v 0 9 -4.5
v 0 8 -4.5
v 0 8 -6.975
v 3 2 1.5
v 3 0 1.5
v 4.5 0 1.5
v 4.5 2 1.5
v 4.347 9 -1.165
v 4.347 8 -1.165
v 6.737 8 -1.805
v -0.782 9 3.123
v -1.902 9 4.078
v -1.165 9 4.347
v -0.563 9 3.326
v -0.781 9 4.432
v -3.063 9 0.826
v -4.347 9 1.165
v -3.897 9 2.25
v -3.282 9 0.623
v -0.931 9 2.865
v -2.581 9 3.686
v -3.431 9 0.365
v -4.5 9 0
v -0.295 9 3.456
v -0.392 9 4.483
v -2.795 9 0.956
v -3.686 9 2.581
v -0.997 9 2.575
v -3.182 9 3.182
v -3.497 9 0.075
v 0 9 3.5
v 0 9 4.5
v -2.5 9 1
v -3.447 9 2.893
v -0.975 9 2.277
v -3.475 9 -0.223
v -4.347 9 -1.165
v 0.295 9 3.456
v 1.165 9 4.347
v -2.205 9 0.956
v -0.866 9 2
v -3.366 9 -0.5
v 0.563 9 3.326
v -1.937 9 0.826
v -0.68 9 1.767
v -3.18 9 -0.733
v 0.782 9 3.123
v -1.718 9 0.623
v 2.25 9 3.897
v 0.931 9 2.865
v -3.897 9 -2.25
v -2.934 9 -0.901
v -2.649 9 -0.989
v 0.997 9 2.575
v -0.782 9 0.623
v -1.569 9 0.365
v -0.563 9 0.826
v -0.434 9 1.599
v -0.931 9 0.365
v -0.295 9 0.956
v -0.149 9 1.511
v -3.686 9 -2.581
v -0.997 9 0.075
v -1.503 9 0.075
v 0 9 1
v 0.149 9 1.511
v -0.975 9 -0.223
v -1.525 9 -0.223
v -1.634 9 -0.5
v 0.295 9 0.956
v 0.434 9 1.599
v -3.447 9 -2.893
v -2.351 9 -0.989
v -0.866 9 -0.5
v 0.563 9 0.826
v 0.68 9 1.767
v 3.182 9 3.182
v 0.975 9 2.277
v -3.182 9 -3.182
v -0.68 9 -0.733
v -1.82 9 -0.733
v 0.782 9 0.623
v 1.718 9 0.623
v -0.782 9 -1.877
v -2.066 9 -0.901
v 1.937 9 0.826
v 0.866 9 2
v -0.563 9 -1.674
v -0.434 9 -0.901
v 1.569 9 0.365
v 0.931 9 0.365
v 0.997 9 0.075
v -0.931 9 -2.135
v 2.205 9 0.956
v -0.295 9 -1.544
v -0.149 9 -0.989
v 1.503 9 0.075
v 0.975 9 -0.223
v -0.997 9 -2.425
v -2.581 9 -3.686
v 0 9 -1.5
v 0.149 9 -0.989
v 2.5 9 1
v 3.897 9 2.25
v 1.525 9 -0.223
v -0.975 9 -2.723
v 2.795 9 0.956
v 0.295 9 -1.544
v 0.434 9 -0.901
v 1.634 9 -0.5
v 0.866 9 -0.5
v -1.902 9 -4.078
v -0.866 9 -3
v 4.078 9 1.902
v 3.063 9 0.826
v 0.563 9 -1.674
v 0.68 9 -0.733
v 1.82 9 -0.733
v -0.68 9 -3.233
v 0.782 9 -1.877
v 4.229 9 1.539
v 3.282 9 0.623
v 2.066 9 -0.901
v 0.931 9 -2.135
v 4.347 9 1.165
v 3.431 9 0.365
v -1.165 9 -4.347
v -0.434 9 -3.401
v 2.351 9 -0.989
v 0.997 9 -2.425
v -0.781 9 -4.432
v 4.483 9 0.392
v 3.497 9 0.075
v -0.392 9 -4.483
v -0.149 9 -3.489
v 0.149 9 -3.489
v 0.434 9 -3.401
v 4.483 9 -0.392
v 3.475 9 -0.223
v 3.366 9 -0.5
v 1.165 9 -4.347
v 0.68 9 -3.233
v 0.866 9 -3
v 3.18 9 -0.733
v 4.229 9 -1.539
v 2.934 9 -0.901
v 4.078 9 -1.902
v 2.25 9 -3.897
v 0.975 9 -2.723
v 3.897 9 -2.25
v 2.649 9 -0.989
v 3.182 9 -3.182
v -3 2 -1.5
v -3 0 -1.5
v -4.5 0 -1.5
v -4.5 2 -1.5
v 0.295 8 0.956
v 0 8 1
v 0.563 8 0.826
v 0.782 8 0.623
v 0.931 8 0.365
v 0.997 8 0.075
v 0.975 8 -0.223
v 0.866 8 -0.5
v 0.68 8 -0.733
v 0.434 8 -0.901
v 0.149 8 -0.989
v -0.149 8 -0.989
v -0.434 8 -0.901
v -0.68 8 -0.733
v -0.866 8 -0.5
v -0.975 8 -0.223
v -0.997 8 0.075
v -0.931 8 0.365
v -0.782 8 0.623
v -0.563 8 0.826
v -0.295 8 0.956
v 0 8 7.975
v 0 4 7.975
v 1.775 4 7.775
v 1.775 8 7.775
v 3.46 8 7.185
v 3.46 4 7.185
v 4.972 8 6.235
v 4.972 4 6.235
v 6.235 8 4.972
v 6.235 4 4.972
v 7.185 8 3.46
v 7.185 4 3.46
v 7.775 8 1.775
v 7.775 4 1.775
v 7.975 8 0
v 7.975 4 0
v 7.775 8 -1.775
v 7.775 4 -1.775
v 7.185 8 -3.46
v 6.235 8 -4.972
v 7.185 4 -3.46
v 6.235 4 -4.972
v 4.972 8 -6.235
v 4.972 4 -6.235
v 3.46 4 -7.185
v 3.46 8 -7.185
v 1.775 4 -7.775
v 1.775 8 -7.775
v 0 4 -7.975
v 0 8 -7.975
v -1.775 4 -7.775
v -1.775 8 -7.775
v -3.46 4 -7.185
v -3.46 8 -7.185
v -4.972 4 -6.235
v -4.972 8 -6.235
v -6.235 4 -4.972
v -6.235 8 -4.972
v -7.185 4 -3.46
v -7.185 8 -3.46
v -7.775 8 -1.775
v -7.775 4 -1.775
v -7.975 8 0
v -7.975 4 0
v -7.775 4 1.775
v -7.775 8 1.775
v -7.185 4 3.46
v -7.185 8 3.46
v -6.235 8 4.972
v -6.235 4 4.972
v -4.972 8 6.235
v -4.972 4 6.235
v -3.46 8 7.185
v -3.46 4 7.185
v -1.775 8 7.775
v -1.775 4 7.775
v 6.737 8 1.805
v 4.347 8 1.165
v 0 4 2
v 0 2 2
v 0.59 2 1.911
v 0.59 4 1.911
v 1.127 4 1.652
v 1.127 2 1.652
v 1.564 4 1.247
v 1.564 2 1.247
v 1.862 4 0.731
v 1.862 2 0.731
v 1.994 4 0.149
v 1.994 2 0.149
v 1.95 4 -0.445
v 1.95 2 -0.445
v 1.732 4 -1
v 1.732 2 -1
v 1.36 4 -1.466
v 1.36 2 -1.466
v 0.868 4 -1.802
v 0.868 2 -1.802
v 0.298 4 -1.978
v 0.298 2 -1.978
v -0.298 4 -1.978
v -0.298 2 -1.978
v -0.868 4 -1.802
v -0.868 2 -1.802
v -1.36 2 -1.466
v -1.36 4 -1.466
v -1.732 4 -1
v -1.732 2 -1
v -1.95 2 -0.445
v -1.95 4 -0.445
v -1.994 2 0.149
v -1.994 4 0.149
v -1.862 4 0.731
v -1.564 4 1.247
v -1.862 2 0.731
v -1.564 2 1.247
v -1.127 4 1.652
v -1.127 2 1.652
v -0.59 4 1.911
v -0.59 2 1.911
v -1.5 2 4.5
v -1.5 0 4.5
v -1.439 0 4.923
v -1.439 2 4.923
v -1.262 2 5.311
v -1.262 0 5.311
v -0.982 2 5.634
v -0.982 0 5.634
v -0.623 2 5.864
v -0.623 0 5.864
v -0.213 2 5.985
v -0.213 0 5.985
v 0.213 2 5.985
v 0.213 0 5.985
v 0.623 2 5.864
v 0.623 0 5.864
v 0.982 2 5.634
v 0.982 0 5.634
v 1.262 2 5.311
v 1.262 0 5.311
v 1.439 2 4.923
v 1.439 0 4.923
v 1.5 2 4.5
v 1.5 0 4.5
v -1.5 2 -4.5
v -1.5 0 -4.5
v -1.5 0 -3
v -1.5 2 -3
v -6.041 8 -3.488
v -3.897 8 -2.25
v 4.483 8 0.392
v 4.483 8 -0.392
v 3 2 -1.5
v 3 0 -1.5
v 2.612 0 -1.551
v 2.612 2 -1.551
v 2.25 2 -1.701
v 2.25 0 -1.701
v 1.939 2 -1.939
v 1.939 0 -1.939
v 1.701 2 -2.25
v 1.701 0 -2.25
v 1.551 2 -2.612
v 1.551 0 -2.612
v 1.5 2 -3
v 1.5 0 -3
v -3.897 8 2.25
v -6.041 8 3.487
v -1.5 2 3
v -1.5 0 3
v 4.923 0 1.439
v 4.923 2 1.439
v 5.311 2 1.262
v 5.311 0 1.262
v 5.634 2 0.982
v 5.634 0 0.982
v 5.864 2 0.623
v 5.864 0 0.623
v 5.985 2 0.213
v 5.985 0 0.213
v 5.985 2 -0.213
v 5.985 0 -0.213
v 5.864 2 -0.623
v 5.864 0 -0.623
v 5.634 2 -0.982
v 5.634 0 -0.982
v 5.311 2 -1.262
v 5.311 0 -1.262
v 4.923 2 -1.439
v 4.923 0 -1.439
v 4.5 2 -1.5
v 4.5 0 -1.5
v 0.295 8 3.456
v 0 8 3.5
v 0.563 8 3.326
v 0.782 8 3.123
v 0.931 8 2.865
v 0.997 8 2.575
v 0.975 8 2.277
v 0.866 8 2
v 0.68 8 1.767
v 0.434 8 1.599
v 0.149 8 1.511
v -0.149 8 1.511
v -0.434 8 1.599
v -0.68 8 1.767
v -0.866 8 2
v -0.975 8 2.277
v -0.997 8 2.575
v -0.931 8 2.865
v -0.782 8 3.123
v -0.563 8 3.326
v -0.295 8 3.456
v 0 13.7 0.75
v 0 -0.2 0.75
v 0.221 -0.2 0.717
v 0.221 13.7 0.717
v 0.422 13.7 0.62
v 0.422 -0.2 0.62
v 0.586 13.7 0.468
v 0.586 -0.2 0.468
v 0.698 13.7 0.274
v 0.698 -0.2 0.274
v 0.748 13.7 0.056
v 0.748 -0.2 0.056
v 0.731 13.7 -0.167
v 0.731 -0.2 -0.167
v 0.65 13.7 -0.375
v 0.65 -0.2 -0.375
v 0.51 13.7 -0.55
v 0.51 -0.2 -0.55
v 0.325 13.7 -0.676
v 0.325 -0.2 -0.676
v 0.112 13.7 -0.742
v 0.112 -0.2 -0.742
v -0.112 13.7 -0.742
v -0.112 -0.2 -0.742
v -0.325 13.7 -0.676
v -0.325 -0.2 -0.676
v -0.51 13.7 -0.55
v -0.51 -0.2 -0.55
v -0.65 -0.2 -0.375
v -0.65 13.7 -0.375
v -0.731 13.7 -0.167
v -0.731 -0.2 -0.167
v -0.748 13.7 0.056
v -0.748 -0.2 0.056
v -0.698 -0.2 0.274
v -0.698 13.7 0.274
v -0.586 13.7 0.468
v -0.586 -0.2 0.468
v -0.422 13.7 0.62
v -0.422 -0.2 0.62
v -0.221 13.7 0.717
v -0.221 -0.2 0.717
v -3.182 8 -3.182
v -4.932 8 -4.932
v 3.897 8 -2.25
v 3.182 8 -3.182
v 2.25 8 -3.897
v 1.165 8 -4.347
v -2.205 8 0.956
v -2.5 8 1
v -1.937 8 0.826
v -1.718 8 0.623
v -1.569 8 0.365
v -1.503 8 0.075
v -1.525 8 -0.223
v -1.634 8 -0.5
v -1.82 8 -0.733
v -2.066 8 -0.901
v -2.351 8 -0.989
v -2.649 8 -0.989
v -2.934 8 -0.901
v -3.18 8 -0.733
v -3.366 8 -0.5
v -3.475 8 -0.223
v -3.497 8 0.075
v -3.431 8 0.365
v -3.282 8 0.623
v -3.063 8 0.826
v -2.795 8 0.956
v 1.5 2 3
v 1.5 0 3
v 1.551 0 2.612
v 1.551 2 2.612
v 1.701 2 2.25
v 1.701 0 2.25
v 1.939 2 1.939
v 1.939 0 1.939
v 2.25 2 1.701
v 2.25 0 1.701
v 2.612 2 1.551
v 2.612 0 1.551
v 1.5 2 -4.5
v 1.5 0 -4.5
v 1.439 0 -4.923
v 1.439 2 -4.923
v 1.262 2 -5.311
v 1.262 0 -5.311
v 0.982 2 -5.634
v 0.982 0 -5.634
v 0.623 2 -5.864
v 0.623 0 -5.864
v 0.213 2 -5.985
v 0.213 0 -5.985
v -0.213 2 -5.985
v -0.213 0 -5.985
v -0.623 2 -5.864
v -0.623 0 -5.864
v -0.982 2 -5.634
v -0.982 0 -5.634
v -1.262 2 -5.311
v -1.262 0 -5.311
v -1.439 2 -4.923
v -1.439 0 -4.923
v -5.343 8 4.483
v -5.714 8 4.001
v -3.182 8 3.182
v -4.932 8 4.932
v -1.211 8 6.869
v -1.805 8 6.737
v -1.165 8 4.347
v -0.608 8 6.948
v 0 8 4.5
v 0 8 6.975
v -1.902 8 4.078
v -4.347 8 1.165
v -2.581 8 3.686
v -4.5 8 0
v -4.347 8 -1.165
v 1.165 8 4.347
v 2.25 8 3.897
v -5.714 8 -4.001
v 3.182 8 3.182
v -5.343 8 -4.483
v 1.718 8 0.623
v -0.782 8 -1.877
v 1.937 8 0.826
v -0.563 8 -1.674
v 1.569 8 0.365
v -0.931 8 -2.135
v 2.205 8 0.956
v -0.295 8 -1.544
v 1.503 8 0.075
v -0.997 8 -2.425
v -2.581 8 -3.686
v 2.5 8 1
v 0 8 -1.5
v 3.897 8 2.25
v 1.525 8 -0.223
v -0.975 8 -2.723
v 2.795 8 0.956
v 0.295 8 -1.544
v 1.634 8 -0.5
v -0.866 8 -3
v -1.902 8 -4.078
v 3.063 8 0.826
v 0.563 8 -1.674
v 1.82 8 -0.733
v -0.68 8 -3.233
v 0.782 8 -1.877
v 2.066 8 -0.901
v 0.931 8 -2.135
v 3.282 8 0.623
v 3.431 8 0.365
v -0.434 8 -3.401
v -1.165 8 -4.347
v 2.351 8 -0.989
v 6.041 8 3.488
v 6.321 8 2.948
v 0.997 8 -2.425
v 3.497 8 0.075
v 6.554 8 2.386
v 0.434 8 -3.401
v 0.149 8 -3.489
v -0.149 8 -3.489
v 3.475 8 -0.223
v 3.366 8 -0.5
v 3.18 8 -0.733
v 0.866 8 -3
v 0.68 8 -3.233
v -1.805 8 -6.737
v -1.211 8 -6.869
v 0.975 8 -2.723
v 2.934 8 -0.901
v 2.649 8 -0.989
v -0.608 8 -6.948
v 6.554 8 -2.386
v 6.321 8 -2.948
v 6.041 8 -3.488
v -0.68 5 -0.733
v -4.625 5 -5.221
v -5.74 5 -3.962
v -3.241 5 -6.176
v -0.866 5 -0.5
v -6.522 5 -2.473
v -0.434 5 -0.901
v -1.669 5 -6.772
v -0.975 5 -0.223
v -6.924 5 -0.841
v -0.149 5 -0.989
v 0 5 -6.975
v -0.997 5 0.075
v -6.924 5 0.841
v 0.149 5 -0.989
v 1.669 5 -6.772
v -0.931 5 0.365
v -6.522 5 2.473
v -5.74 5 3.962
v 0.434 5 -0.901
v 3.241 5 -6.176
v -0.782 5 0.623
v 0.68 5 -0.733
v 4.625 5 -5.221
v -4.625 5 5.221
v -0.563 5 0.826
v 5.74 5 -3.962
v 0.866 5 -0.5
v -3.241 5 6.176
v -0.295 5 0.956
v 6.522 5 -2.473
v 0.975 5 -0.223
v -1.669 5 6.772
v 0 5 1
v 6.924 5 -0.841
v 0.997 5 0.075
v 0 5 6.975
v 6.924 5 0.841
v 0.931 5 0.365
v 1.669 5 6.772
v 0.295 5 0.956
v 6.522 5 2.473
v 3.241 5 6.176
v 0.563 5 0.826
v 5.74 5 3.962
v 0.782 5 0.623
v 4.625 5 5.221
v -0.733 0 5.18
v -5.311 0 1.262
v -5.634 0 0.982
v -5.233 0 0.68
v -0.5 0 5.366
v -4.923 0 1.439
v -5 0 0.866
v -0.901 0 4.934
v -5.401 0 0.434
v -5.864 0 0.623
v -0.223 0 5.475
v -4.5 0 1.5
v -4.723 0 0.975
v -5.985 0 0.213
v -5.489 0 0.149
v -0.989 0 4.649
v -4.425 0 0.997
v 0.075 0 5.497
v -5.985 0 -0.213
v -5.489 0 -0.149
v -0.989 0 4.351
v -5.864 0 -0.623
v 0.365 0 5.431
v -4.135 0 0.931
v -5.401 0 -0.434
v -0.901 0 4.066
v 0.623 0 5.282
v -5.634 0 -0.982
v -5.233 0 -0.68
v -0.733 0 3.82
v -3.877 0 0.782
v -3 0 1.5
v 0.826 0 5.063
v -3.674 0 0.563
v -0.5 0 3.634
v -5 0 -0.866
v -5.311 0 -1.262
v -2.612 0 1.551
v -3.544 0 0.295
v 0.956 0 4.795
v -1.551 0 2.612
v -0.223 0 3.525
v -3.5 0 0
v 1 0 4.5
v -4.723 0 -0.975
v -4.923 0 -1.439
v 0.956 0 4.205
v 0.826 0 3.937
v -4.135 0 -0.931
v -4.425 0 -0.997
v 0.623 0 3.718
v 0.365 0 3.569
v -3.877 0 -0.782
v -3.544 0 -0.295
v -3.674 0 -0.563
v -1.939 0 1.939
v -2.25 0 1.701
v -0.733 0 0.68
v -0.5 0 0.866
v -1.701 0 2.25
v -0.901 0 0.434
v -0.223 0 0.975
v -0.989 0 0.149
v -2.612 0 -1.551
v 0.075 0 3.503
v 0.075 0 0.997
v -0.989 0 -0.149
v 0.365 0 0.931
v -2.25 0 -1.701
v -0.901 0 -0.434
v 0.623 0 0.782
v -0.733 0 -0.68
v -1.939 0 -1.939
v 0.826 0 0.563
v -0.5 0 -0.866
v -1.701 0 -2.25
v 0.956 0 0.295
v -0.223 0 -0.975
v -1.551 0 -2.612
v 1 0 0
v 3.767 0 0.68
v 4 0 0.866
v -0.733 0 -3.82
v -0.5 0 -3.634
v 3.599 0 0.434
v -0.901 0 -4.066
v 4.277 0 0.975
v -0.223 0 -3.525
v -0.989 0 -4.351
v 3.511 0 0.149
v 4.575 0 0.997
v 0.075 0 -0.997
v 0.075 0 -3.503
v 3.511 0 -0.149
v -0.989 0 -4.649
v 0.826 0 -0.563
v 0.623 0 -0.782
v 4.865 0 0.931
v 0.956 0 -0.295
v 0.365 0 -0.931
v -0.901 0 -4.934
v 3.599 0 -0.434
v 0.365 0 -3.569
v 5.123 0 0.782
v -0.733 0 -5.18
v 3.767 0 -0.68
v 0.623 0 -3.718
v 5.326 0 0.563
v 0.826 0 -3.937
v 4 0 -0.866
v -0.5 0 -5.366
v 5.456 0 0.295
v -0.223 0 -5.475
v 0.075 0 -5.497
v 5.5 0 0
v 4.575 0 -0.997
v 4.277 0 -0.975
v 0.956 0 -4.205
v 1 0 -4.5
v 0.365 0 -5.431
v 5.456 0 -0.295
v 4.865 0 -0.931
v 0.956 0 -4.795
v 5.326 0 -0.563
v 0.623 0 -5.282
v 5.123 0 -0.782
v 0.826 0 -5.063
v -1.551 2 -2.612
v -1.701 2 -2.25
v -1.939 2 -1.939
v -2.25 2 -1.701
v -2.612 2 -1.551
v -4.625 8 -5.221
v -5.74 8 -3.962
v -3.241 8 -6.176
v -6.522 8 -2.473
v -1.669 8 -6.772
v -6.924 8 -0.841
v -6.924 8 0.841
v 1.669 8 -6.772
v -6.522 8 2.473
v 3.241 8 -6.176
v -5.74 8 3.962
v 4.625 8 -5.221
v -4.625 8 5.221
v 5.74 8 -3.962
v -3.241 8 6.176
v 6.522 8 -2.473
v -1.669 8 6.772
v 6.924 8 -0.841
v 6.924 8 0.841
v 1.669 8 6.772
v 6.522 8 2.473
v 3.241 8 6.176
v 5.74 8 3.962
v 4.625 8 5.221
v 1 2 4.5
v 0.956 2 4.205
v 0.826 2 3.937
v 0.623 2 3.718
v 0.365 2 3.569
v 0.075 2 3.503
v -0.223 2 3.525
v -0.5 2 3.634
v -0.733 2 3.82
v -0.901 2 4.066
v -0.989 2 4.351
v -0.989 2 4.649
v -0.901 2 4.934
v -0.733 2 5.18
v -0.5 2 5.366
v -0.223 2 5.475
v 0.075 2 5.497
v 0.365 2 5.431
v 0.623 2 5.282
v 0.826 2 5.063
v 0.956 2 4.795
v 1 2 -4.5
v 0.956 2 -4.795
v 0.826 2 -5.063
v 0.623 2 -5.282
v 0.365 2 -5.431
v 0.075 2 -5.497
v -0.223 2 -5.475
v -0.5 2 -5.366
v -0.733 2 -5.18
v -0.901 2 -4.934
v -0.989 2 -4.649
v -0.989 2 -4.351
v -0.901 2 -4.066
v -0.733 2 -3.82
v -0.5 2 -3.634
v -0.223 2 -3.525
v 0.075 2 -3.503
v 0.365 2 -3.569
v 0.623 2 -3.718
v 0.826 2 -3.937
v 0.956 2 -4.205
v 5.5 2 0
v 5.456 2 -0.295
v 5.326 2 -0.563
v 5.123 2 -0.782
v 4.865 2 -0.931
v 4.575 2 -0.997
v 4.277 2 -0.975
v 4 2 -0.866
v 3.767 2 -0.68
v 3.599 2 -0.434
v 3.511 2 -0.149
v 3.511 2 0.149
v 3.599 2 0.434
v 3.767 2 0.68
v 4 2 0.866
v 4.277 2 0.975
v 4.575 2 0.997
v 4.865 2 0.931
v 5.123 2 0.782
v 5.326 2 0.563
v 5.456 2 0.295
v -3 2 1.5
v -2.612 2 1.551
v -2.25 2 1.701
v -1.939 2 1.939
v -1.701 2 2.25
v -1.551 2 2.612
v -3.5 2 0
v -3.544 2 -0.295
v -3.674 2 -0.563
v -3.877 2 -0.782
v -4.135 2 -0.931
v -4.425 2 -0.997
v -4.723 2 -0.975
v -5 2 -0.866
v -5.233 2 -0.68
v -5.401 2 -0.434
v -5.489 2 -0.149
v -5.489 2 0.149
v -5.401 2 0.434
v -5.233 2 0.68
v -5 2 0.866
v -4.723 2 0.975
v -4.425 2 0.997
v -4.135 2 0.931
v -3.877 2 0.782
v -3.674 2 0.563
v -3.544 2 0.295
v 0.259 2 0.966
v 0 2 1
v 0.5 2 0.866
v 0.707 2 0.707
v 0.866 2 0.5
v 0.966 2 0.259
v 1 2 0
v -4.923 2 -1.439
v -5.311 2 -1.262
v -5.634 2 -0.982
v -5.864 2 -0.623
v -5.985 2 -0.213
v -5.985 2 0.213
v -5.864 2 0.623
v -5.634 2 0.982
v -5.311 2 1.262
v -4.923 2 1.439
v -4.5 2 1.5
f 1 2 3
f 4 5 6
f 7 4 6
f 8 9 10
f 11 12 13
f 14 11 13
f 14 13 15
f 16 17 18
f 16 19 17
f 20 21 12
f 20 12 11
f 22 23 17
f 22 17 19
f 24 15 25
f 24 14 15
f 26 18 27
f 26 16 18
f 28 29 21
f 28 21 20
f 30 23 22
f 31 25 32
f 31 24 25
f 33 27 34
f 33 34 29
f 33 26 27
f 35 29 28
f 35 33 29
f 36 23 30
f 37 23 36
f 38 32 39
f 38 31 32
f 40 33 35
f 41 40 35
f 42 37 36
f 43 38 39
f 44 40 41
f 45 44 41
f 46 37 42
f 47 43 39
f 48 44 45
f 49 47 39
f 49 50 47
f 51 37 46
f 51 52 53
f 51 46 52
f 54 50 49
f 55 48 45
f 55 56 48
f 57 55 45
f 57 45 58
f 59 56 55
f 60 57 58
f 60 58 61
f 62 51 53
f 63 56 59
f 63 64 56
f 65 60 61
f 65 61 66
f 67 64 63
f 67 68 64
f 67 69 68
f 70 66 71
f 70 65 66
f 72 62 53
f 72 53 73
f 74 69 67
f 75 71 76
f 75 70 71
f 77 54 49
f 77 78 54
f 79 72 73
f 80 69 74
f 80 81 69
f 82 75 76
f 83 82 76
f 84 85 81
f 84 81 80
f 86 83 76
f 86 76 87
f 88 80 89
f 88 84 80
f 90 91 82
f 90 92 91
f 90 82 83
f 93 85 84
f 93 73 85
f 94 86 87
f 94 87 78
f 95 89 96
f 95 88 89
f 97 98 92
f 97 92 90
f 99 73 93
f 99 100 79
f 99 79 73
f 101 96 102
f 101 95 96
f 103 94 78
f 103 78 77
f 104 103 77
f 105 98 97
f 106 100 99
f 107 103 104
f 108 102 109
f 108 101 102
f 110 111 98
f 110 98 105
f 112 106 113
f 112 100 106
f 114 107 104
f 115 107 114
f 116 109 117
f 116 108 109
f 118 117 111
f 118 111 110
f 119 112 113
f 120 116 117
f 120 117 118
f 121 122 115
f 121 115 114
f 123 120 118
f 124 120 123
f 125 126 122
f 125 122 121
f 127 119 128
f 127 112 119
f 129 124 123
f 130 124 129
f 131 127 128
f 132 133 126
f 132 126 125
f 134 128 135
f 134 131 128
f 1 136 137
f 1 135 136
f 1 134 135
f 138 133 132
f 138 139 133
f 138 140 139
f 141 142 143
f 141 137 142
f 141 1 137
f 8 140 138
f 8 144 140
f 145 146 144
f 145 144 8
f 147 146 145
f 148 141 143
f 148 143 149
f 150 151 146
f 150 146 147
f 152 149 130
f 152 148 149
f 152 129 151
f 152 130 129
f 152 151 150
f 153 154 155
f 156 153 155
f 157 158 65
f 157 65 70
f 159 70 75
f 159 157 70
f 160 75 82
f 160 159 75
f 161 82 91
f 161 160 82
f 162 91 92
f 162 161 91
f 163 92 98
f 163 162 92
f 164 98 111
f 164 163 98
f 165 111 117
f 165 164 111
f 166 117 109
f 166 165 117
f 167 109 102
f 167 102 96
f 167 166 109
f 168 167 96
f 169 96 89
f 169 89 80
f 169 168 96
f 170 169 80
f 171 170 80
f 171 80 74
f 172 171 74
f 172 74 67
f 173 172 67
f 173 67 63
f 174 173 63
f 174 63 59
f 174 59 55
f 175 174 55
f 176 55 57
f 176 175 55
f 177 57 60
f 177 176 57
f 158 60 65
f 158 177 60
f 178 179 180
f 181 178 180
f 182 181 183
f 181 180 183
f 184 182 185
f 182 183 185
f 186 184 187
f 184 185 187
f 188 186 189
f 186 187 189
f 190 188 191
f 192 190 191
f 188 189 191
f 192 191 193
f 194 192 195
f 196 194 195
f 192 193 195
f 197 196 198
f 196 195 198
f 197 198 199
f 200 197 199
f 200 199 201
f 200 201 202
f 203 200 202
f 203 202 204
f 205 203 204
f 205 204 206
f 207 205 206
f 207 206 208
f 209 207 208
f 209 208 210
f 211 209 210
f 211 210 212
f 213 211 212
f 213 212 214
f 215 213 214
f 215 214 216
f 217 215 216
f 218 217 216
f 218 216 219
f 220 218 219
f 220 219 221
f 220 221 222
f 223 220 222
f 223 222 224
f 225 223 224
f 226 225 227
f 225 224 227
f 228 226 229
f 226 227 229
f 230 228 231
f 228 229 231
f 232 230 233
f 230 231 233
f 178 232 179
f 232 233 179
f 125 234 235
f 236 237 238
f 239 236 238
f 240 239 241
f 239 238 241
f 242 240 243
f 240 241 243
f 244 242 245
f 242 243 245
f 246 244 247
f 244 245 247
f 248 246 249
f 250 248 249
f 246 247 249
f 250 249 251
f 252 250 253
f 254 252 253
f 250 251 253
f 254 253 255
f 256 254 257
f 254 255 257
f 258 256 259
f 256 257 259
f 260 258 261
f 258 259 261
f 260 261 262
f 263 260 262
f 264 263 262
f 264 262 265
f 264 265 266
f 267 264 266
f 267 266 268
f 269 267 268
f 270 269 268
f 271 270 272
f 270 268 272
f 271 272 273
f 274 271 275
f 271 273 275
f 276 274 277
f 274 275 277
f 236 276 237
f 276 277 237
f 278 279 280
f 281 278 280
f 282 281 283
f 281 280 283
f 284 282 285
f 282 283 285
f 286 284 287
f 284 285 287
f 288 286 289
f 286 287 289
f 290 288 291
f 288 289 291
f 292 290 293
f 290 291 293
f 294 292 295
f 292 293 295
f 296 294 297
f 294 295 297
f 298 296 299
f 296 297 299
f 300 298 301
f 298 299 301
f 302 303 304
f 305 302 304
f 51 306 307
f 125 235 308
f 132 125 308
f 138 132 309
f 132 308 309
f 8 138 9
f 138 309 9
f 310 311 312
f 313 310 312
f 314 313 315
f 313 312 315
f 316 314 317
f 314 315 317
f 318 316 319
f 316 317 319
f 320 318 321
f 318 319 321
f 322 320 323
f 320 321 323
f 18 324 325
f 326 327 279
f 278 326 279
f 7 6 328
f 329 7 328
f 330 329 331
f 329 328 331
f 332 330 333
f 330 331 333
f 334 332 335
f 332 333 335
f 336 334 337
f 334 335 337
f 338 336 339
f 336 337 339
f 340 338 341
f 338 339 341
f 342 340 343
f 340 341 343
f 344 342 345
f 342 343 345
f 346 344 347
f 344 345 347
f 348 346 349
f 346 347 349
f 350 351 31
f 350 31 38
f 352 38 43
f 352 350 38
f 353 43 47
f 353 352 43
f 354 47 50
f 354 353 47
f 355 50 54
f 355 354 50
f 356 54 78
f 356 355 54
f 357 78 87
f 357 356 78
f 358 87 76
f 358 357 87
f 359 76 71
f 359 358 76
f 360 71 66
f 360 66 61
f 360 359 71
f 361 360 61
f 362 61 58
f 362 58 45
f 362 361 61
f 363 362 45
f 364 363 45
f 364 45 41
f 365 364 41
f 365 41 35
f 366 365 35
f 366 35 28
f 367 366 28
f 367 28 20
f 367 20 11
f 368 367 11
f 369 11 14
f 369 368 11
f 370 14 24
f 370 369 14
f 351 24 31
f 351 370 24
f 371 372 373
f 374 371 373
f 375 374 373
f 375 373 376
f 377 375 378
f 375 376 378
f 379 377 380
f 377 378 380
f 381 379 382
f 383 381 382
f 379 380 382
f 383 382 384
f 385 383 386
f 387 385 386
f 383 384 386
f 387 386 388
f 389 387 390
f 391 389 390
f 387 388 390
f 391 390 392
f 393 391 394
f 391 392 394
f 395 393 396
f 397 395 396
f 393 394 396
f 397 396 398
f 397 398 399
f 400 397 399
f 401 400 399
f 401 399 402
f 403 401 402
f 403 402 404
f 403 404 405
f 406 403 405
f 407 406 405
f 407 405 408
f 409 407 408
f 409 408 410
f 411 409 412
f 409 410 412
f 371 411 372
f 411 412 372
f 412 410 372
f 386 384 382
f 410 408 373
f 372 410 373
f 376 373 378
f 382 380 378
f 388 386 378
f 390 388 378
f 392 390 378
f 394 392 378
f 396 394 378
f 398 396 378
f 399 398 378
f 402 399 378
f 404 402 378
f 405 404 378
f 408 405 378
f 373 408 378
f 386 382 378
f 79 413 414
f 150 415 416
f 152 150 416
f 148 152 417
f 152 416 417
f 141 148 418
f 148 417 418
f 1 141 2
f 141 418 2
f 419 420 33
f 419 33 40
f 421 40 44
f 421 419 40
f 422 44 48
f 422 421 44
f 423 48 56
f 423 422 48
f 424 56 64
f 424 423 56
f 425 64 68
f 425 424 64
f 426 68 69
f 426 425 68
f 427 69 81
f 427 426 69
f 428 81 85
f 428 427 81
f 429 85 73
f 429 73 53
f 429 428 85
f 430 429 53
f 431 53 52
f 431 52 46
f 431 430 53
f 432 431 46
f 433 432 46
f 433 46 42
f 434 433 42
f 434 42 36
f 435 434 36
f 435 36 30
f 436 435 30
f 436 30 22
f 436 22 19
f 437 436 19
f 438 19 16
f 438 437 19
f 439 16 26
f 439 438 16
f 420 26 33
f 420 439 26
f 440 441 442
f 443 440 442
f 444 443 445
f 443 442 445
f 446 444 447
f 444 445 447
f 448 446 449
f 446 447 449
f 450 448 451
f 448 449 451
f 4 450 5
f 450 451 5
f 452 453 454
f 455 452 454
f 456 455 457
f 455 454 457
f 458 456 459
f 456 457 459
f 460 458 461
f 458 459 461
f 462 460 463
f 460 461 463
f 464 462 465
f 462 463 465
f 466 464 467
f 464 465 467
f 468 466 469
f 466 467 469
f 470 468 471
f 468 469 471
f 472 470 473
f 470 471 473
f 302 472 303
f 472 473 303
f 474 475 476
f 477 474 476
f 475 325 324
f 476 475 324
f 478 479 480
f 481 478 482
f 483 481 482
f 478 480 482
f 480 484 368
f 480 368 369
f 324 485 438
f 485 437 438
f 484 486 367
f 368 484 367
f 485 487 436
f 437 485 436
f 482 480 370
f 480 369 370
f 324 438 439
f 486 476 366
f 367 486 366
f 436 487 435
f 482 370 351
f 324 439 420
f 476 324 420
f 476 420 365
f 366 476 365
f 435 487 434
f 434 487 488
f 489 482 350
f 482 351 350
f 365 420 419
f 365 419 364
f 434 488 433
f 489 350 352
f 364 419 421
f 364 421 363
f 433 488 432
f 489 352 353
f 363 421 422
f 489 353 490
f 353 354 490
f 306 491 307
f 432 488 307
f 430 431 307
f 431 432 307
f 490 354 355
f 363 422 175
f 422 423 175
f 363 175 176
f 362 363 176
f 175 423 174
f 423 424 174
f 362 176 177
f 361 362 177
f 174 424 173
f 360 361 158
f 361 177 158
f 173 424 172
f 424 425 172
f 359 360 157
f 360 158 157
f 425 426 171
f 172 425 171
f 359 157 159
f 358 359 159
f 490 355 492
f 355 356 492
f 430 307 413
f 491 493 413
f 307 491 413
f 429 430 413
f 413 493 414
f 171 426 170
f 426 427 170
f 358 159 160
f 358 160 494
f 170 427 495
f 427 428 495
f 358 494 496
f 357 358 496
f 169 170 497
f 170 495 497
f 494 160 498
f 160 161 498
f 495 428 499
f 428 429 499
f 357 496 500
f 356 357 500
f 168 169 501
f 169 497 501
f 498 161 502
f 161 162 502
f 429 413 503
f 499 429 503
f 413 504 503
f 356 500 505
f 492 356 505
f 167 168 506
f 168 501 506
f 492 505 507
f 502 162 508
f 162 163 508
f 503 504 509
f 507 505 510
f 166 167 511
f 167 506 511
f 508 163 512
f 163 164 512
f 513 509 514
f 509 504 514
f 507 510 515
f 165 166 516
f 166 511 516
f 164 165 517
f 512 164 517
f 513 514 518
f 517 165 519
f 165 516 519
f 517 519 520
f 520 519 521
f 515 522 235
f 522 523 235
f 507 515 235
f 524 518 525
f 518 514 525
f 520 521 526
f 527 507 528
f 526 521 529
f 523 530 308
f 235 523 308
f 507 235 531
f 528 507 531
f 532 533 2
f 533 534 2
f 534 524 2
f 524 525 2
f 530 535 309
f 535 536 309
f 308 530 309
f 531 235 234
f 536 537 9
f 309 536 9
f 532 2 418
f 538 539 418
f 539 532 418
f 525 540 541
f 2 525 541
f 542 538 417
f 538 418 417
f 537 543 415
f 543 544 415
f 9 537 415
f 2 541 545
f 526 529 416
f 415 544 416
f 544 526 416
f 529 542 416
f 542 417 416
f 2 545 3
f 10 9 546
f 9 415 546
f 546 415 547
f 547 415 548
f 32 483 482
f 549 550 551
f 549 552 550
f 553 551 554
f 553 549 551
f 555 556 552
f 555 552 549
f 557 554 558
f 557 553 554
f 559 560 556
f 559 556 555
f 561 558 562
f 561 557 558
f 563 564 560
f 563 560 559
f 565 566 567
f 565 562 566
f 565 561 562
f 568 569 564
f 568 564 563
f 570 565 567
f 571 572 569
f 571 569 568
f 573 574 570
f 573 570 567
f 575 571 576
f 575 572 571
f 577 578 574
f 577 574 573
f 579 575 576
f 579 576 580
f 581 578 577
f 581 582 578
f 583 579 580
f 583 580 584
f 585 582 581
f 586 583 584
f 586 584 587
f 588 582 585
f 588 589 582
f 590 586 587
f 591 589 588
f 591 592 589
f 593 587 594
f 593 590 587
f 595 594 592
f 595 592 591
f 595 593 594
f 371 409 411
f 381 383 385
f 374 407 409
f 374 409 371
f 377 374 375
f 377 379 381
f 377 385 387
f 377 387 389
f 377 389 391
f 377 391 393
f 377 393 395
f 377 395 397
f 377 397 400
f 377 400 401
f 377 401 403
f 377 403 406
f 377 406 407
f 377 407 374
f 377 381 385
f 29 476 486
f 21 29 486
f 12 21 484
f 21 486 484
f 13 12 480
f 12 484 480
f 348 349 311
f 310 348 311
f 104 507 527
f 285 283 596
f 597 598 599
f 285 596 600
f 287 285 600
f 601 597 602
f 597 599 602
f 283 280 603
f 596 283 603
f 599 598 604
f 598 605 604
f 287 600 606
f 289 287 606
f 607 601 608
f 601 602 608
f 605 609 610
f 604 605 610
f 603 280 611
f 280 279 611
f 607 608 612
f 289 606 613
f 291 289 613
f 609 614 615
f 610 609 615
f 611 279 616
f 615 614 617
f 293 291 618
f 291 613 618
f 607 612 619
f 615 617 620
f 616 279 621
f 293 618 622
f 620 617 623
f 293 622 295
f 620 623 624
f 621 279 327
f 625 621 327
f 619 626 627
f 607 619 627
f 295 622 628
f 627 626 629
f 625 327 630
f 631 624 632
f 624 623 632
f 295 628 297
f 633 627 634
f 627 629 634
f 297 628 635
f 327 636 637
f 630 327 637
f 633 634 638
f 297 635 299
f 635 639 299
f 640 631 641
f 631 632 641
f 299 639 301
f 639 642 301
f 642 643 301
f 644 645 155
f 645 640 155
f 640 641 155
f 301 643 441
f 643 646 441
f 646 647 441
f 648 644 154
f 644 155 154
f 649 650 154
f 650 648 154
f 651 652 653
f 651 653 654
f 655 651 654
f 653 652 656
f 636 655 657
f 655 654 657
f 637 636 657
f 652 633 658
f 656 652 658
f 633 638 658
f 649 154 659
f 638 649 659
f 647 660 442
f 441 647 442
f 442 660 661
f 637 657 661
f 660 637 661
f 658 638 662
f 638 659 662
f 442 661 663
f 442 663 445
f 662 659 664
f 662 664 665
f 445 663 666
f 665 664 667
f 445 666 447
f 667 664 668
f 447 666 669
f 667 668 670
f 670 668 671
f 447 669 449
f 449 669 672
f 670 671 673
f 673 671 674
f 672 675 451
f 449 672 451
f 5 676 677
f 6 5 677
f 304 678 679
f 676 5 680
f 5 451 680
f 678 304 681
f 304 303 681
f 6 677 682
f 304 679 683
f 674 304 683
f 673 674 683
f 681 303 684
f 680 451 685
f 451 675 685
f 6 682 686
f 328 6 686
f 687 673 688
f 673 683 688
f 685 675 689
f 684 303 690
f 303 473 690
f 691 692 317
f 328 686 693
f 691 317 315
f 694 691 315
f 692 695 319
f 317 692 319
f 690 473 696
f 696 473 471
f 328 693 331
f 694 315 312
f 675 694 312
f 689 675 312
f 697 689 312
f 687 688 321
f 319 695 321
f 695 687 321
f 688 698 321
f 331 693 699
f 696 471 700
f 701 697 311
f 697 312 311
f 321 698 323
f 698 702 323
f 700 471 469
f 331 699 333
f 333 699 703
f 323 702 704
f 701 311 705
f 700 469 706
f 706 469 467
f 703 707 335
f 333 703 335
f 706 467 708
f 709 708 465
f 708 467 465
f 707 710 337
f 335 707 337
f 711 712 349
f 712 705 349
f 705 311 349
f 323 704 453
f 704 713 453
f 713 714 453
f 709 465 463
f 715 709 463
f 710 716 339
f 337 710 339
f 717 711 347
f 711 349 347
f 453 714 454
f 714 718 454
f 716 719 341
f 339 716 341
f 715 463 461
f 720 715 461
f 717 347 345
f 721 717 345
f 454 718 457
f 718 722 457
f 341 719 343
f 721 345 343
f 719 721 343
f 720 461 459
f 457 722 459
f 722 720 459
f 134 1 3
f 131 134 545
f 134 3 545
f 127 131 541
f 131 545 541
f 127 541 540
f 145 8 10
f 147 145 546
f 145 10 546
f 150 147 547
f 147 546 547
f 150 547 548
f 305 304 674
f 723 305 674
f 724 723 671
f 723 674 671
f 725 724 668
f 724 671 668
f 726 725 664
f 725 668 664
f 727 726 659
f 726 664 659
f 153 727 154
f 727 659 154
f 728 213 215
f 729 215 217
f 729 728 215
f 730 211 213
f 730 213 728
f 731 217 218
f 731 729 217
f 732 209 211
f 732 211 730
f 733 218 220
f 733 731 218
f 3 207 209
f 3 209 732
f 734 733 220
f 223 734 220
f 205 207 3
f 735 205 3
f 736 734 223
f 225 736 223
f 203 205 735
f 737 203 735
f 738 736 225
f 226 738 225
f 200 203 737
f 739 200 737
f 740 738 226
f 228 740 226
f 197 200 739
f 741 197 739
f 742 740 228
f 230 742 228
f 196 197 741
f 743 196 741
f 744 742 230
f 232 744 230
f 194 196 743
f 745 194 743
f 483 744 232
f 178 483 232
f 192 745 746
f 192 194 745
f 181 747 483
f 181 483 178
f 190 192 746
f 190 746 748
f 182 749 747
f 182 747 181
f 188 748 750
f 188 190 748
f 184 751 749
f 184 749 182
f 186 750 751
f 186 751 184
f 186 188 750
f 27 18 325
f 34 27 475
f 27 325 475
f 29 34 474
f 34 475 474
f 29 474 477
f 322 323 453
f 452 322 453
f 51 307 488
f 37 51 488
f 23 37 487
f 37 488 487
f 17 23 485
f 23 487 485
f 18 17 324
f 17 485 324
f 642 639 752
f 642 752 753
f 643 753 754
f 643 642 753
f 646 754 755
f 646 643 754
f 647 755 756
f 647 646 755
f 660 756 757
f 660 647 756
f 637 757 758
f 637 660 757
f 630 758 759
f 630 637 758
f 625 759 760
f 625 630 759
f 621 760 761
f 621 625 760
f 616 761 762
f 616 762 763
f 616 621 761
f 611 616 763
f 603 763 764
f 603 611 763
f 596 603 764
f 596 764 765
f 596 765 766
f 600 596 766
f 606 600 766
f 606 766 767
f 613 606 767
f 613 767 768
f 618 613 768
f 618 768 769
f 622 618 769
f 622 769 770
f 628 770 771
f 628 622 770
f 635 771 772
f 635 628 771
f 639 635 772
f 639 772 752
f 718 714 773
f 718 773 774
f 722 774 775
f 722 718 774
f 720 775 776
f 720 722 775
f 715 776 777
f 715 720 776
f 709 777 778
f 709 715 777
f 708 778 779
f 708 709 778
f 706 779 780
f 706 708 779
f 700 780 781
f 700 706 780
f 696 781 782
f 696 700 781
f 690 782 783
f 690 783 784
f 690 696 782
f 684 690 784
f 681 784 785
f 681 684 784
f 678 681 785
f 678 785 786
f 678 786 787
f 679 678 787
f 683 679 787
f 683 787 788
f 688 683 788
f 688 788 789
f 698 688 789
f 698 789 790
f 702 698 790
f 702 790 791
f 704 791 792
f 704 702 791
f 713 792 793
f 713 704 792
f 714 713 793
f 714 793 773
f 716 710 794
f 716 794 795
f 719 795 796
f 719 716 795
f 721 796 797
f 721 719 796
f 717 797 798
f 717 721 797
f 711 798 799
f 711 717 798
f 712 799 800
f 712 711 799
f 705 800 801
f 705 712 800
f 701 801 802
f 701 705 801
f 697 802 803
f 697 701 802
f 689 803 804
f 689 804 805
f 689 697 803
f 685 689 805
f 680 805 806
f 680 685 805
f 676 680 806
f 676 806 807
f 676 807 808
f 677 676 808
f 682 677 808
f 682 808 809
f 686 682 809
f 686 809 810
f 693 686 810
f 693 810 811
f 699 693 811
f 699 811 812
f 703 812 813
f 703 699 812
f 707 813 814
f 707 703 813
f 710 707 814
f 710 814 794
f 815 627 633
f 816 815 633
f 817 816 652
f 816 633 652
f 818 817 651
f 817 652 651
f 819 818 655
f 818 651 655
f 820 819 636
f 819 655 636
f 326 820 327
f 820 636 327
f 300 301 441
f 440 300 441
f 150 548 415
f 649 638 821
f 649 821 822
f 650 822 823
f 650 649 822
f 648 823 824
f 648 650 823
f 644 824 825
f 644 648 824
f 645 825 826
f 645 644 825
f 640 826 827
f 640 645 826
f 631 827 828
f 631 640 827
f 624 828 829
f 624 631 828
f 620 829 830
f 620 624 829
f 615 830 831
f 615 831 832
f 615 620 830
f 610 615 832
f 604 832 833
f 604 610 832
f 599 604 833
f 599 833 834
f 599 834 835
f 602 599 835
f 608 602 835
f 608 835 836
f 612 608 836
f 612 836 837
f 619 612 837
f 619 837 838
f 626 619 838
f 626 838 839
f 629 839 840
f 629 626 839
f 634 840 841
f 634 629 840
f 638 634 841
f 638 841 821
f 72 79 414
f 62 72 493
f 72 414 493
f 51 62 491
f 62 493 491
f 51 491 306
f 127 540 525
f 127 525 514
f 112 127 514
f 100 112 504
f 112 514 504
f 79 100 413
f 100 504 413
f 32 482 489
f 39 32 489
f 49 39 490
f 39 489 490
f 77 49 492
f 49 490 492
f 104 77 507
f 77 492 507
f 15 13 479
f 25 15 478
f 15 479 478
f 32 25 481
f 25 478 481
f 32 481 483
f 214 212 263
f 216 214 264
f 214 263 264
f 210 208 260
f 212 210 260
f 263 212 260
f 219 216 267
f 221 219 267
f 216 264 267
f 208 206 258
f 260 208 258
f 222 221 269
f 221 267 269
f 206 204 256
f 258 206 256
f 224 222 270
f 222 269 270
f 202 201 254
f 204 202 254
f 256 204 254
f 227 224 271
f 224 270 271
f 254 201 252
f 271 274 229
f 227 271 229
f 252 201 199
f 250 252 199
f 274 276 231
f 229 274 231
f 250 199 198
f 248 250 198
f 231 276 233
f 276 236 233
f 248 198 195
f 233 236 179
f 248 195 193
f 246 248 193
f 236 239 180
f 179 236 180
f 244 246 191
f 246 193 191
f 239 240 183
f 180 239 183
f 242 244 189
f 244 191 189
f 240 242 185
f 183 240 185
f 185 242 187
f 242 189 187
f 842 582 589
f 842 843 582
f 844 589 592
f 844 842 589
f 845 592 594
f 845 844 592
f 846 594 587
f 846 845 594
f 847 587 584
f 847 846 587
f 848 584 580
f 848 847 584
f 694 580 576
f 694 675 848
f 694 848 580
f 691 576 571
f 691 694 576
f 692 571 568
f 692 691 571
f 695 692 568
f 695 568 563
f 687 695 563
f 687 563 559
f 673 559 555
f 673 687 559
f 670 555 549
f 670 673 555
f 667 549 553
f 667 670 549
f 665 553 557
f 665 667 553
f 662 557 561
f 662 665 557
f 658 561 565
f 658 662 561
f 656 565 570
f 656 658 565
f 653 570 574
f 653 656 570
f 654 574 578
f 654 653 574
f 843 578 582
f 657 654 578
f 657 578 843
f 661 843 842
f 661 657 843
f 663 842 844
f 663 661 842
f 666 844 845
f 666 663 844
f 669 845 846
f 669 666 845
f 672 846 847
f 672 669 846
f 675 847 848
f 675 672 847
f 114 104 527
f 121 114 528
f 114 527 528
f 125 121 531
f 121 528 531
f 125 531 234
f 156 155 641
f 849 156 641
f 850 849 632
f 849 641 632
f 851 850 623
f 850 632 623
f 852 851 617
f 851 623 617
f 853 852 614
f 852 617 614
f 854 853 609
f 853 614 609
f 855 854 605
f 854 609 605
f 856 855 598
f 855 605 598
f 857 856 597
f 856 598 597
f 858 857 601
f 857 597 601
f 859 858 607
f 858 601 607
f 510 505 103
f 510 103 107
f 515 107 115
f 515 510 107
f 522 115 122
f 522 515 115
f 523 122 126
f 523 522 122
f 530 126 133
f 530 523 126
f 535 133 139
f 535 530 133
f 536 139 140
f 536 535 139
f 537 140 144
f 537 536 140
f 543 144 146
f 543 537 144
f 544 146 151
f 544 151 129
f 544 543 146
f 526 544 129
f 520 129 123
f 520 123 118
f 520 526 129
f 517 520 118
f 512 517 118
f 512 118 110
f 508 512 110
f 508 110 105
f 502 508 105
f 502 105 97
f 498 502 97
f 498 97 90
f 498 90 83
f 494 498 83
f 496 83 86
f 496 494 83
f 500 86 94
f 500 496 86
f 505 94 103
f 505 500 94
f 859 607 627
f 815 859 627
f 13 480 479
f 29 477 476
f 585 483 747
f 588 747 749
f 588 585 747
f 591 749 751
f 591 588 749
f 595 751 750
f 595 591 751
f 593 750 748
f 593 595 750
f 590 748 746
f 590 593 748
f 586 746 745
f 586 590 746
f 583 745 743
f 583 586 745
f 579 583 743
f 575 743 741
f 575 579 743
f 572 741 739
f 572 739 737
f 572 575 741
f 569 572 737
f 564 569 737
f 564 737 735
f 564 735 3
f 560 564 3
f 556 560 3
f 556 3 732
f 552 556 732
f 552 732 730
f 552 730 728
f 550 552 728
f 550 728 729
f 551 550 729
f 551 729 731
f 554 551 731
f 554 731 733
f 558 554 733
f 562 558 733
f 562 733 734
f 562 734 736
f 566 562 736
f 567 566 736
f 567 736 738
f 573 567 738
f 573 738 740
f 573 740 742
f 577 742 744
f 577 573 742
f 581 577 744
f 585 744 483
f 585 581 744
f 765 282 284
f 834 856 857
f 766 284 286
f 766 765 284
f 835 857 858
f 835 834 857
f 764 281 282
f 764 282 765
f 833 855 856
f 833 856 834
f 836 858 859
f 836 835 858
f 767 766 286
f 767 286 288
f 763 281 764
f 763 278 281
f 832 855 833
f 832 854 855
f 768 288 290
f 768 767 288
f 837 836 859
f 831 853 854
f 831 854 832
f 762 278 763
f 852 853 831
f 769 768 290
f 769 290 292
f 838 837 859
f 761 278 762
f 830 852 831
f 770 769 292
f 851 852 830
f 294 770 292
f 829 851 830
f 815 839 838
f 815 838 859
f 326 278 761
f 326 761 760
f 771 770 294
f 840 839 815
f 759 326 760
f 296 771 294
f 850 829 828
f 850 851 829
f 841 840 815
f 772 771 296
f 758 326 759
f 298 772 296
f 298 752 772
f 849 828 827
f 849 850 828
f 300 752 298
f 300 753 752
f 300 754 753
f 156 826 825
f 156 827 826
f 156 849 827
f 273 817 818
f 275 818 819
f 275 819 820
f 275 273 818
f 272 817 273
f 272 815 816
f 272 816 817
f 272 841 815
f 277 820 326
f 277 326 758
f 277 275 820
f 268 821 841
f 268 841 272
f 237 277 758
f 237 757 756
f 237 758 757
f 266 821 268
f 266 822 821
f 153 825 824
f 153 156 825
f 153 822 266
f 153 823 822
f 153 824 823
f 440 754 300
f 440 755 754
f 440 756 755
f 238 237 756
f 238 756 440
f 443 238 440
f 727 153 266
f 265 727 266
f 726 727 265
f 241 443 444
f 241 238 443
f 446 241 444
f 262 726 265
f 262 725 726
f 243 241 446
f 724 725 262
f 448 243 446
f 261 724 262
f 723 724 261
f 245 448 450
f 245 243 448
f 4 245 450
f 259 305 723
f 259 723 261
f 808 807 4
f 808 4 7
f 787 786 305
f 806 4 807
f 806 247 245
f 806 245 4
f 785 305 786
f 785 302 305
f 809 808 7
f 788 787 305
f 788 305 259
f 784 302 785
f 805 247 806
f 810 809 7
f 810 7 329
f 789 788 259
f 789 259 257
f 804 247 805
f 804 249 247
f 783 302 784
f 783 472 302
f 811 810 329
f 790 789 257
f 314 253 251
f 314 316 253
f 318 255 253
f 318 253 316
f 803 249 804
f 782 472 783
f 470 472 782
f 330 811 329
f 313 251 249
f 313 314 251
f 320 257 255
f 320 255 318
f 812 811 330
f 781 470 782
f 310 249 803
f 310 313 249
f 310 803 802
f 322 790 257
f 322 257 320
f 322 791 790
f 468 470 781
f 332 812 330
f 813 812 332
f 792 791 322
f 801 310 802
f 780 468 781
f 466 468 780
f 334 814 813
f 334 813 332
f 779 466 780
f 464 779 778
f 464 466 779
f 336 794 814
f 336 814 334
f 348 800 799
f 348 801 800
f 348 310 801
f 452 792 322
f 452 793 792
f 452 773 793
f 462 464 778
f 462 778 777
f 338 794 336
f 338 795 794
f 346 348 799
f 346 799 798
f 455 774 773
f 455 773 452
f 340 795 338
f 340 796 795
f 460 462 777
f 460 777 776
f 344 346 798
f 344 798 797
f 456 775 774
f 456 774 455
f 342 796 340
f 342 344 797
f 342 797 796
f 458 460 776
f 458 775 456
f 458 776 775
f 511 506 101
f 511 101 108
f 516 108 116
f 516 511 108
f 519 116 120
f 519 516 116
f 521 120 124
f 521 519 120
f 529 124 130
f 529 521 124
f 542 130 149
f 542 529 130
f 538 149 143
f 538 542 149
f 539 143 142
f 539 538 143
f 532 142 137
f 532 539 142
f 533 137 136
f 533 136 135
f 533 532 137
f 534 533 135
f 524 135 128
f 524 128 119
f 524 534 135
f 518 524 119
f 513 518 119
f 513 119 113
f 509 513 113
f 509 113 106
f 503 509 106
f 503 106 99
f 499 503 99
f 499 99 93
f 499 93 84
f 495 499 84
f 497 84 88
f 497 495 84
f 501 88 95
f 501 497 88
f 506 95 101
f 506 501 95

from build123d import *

# Parameters (mm, degrees)
EXTRUDE_1_OUTLINE_R  = 1
EXTRUDE_1_DEPTH      = 2
SKETCH_3_R           = 2
SKETCH_3_R_2         = 1
EXTRUDE_2_DEPTH      = 2
SKETCH_4_R           = 7.975
SKETCH_4_R_2         = 6.975
EXTRUDE_3_DEPTH      = 4
SKETCH_5_R           = 1
EXTRUDE_4_DEPTH      = 1
SKETCH_11_R          = 7.975
SKETCH_11_R_2        = 1
EXTRUDE_5_DEPTH      = 1
EXTRUDE_6_DEPTH      = 13.7
EXTRUDE_6_DEPTH_BACK = 0.2
SKETCH_1_5_R         = 0.75


# Read off the part's stored shape, not the designer's step: 凸台-拉伸1
with BuildPart() as part:
    # 凸台-拉伸1 outline → 凸台-拉伸1 (new body)
    with BuildSketch(Plane(origin=(0, 0, 0), x_dir=(1, 0, 0), z_dir=(0, 1, 0))):
        with BuildLine():
            Line((-3, 1.5), (-4.5, 1.5))
            ThreePointArc((-4.5, 1.5), (-6, 0), (-4.5, -1.5))
            Line((-4.5, -1.5), (-3, -1.5))
            ThreePointArc((-3, -1.5), (-1.939339828, -1.939339828), (-1.5, -3))
            Line((-1.5, -3), (-1.5, -4.5))
            ThreePointArc((-1.5, -4.5), (0, -6), (1.5, -4.5))
            Line((1.5, -4.5), (1.5, -3))
            ThreePointArc((1.5, -3), (1.939339828, -1.939339828), (3, -1.5))
            Line((3, -1.5), (4.5, -1.5))
            ThreePointArc((4.5, -1.5), (6, 0), (4.5, 1.5))
            Line((4.5, 1.5), (3, 1.5))
            ThreePointArc((3, 1.5), (1.939339828, 1.939339828), (1.5, 3))
            Line((1.5, 3), (1.5, 4.5))
            ThreePointArc((1.5, 4.5), (0, 6), (-1.5, 4.5))
            Line((-1.5, 4.5), (-1.5, 3))
            ThreePointArc((-1.5, 3), (-1.939339828, 1.939339828), (-3, 1.5))
        make_face()
        with Locations((0, -4.5)):
            Circle(EXTRUDE_1_OUTLINE_R, mode=Mode.SUBTRACT)
        with Locations((-4.5, 0)):
            Circle(EXTRUDE_1_OUTLINE_R, mode=Mode.SUBTRACT)
        Circle(EXTRUDE_1_OUTLINE_R, mode=Mode.SUBTRACT)
        with Locations((4.5, 0)):
            Circle(EXTRUDE_1_OUTLINE_R, mode=Mode.SUBTRACT)
        with Locations((0, 4.5)):
            Circle(EXTRUDE_1_OUTLINE_R, mode=Mode.SUBTRACT)
    extrude(amount=EXTRUDE_1_DEPTH)

    # 草图3 → 凸台-拉伸2 (add)
    with BuildSketch(Plane(origin=(0, 2, 0), x_dir=(1, 0, 0), z_dir=(0, 1, 0))):
        with Locations(Location((0, 0, 0), (0, 0, 270))):
            Circle(SKETCH_3_R)
        with Locations(Location((0, 0, 0), (0, 0, 270))):
            Circle(SKETCH_3_R_2, mode=Mode.SUBTRACT)
    extrude(amount=EXTRUDE_2_DEPTH)



with BuildPart() as body_2:
    # 草图4 → 凸台-拉伸3 (new body)
    with BuildSketch(Plane(origin=(0, 4, 0), x_dir=(1, 0, 0), z_dir=(0, 1, 0))):
        with Locations(Location((0, 0, 0), (0, 0, 270))):
            Circle(SKETCH_4_R)
        with Locations(Location((0, 0, 0), (0, 0, 270))):
            Circle(SKETCH_4_R_2, mode=Mode.SUBTRACT)
    extrude(amount=EXTRUDE_3_DEPTH)


with BuildPart() as body_3:
    # 草图5 → 凸台-拉伸4 (new body)
    with BuildSketch(Plane(origin=(0, 8, 0), x_dir=(1, 0, 0), z_dir=(0, 1, 0))):
        with BuildLine():
            Line((6.737332638, -1.80526284), (4.346666218, -1.164685703))
            ThreePointArc((4.346666218, -1.164685703), (4.5, 0), (4.346666218, 1.164685703))
            Line((4.346666218, 1.164685703), (6.737332638, 1.80526284))
            ThreePointArc((6.737332638, 1.80526284), (6.444059739, 2.669216941), (6.040527191, 3.4875))
            Line((6.040527191, 3.4875), (3.897114317, 2.25))
            ThreePointArc((3.897114317, 2.25), (2.25, 3.897114317), (0, 4.5))
            Line((0, 4.5), (0, 6.975))
            ThreePointArc((0, 6.975), (-0.910420191, 6.915327908), (-1.80526284, 6.737332638))
            Line((-1.80526284, 6.737332638), (-1.164685703, 4.346666218))
            ThreePointArc((-1.164685703, 4.346666218), (-2.25, 3.897114317), (-3.181980515, 3.181980515))
            Line((-3.181980515, 3.181980515), (-4.932069799, 4.932069799))
            ThreePointArc((-4.932069799, 4.932069799), (-5.533639549, 4.246110967), (-6.040527191, 3.4875))
            Line((-6.040527191, 3.4875), (-3.897114317, 2.25))
            ThreePointArc((-3.897114317, 2.25), (-4.5, 0), (-3.897114317, -2.25))
            Line((-3.897114317, -2.25), (-6.040527191, -3.4875))
            ThreePointArc((-6.040527191, -3.4875), (-5.533639549, -4.246110967), (-4.932069799, -4.932069799))
            Line((-4.932069799, -4.932069799), (-3.181980515, -3.181980515))
            ThreePointArc((-3.181980515, -3.181980515), (-2.25, -3.897114317), (-1.164685703, -4.346666218))
            Line((-1.164685703, -4.346666218), (-1.80526284, -6.737332638))
            ThreePointArc((-1.80526284, -6.737332638), (-0.910420191, -6.915327908), (0, -6.975))
            Line((0, -6.975), (0, -4.5))
            ThreePointArc((0, -4.5), (2.25, -3.897114317), (3.897114317, -2.25))
            Line((3.897114317, -2.25), (6.040527191, -3.4875))
            ThreePointArc((6.040527191, -3.4875), (6.444059739, -2.669216941), (6.737332638, -1.80526284))
        make_face()
        with Locations(Location((0, 2.5, 0), (0, 0, 270))):
            Circle(SKETCH_5_R, mode=Mode.SUBTRACT)
        with Locations(Location((0, -2.5, 0), (0, 0, 270))):
            Circle(SKETCH_5_R, mode=Mode.SUBTRACT)
        with Locations(Location((-2.5, 0, 0), (0, 0, 270))):
            Circle(SKETCH_5_R, mode=Mode.SUBTRACT)
        with Locations(Location((0, 0, 0), (0, 0, 270))):
            Circle(SKETCH_5_R, mode=Mode.SUBTRACT)
        with Locations(Location((2.5, 0, 0), (0, 0, 270))):
            Circle(SKETCH_5_R, mode=Mode.SUBTRACT)
    extrude(amount=EXTRUDE_4_DEPTH)

    # 草图7 → 切除-旋转2 (revolve, cut)
    with BuildSketch(Plane(origin=(0, 0, 0), x_dir=(0.8660254037844349, 0, 0.5000000000000067), z_dir=(-0.5000000000000066, 0, 0.8660254037844348)), mode=Mode.PRIVATE) as cut_revolve_2_sk:
        Polygon((-4.5, 9), (-6.975, 8), (-6.975, 9), align=None)
    revolve(cut_revolve_2_sk.sketch.rotate(Axis((0, 0, 0), (0, 1, 0)), 120), axis=Axis((0, 0, 0), (0, 1, 0)), mode=Mode.SUBTRACT)


with BuildPart() as part_1:
    add(part.part)

    add(body_2.part)  # 凸台-拉伸5 merges body 2
    # 草图11 → 凸台-拉伸5 (add)
    with BuildSketch(Plane(origin=(0, 4, 0), x_dir=(1, 0, 0), z_dir=(0, 1, 0))):
        with Locations(Location((0, 0, 0), (0, 0, 270))):
            Circle(SKETCH_11_R)
        with Locations(Location((0, 0, 0), (0, 0, 270))):
            Circle(SKETCH_11_R_2, mode=Mode.SUBTRACT)
    extrude(amount=EXTRUDE_5_DEPTH)


with BuildPart() as body_3_2:
    # 草图1<5> → 凸台-拉伸6 (new, two sides: drawn at the far end of the back side and taken through both)
    with BuildSketch(Plane(origin=(0, 0, 0), x_dir=(1, 0, 0), z_dir=(0, 1, 0)).offset(-EXTRUDE_6_DEPTH_BACK)):
        with Locations(Location((0, 0, 0), (0, 0, 270))):
            Circle(SKETCH_1_5_R)
    extrude(amount=EXTRUDE_6_DEPTH + EXTRUDE_6_DEPTH_BACK)


solid = Compound([body_3.part, part_1.part, body_3_2.part])
